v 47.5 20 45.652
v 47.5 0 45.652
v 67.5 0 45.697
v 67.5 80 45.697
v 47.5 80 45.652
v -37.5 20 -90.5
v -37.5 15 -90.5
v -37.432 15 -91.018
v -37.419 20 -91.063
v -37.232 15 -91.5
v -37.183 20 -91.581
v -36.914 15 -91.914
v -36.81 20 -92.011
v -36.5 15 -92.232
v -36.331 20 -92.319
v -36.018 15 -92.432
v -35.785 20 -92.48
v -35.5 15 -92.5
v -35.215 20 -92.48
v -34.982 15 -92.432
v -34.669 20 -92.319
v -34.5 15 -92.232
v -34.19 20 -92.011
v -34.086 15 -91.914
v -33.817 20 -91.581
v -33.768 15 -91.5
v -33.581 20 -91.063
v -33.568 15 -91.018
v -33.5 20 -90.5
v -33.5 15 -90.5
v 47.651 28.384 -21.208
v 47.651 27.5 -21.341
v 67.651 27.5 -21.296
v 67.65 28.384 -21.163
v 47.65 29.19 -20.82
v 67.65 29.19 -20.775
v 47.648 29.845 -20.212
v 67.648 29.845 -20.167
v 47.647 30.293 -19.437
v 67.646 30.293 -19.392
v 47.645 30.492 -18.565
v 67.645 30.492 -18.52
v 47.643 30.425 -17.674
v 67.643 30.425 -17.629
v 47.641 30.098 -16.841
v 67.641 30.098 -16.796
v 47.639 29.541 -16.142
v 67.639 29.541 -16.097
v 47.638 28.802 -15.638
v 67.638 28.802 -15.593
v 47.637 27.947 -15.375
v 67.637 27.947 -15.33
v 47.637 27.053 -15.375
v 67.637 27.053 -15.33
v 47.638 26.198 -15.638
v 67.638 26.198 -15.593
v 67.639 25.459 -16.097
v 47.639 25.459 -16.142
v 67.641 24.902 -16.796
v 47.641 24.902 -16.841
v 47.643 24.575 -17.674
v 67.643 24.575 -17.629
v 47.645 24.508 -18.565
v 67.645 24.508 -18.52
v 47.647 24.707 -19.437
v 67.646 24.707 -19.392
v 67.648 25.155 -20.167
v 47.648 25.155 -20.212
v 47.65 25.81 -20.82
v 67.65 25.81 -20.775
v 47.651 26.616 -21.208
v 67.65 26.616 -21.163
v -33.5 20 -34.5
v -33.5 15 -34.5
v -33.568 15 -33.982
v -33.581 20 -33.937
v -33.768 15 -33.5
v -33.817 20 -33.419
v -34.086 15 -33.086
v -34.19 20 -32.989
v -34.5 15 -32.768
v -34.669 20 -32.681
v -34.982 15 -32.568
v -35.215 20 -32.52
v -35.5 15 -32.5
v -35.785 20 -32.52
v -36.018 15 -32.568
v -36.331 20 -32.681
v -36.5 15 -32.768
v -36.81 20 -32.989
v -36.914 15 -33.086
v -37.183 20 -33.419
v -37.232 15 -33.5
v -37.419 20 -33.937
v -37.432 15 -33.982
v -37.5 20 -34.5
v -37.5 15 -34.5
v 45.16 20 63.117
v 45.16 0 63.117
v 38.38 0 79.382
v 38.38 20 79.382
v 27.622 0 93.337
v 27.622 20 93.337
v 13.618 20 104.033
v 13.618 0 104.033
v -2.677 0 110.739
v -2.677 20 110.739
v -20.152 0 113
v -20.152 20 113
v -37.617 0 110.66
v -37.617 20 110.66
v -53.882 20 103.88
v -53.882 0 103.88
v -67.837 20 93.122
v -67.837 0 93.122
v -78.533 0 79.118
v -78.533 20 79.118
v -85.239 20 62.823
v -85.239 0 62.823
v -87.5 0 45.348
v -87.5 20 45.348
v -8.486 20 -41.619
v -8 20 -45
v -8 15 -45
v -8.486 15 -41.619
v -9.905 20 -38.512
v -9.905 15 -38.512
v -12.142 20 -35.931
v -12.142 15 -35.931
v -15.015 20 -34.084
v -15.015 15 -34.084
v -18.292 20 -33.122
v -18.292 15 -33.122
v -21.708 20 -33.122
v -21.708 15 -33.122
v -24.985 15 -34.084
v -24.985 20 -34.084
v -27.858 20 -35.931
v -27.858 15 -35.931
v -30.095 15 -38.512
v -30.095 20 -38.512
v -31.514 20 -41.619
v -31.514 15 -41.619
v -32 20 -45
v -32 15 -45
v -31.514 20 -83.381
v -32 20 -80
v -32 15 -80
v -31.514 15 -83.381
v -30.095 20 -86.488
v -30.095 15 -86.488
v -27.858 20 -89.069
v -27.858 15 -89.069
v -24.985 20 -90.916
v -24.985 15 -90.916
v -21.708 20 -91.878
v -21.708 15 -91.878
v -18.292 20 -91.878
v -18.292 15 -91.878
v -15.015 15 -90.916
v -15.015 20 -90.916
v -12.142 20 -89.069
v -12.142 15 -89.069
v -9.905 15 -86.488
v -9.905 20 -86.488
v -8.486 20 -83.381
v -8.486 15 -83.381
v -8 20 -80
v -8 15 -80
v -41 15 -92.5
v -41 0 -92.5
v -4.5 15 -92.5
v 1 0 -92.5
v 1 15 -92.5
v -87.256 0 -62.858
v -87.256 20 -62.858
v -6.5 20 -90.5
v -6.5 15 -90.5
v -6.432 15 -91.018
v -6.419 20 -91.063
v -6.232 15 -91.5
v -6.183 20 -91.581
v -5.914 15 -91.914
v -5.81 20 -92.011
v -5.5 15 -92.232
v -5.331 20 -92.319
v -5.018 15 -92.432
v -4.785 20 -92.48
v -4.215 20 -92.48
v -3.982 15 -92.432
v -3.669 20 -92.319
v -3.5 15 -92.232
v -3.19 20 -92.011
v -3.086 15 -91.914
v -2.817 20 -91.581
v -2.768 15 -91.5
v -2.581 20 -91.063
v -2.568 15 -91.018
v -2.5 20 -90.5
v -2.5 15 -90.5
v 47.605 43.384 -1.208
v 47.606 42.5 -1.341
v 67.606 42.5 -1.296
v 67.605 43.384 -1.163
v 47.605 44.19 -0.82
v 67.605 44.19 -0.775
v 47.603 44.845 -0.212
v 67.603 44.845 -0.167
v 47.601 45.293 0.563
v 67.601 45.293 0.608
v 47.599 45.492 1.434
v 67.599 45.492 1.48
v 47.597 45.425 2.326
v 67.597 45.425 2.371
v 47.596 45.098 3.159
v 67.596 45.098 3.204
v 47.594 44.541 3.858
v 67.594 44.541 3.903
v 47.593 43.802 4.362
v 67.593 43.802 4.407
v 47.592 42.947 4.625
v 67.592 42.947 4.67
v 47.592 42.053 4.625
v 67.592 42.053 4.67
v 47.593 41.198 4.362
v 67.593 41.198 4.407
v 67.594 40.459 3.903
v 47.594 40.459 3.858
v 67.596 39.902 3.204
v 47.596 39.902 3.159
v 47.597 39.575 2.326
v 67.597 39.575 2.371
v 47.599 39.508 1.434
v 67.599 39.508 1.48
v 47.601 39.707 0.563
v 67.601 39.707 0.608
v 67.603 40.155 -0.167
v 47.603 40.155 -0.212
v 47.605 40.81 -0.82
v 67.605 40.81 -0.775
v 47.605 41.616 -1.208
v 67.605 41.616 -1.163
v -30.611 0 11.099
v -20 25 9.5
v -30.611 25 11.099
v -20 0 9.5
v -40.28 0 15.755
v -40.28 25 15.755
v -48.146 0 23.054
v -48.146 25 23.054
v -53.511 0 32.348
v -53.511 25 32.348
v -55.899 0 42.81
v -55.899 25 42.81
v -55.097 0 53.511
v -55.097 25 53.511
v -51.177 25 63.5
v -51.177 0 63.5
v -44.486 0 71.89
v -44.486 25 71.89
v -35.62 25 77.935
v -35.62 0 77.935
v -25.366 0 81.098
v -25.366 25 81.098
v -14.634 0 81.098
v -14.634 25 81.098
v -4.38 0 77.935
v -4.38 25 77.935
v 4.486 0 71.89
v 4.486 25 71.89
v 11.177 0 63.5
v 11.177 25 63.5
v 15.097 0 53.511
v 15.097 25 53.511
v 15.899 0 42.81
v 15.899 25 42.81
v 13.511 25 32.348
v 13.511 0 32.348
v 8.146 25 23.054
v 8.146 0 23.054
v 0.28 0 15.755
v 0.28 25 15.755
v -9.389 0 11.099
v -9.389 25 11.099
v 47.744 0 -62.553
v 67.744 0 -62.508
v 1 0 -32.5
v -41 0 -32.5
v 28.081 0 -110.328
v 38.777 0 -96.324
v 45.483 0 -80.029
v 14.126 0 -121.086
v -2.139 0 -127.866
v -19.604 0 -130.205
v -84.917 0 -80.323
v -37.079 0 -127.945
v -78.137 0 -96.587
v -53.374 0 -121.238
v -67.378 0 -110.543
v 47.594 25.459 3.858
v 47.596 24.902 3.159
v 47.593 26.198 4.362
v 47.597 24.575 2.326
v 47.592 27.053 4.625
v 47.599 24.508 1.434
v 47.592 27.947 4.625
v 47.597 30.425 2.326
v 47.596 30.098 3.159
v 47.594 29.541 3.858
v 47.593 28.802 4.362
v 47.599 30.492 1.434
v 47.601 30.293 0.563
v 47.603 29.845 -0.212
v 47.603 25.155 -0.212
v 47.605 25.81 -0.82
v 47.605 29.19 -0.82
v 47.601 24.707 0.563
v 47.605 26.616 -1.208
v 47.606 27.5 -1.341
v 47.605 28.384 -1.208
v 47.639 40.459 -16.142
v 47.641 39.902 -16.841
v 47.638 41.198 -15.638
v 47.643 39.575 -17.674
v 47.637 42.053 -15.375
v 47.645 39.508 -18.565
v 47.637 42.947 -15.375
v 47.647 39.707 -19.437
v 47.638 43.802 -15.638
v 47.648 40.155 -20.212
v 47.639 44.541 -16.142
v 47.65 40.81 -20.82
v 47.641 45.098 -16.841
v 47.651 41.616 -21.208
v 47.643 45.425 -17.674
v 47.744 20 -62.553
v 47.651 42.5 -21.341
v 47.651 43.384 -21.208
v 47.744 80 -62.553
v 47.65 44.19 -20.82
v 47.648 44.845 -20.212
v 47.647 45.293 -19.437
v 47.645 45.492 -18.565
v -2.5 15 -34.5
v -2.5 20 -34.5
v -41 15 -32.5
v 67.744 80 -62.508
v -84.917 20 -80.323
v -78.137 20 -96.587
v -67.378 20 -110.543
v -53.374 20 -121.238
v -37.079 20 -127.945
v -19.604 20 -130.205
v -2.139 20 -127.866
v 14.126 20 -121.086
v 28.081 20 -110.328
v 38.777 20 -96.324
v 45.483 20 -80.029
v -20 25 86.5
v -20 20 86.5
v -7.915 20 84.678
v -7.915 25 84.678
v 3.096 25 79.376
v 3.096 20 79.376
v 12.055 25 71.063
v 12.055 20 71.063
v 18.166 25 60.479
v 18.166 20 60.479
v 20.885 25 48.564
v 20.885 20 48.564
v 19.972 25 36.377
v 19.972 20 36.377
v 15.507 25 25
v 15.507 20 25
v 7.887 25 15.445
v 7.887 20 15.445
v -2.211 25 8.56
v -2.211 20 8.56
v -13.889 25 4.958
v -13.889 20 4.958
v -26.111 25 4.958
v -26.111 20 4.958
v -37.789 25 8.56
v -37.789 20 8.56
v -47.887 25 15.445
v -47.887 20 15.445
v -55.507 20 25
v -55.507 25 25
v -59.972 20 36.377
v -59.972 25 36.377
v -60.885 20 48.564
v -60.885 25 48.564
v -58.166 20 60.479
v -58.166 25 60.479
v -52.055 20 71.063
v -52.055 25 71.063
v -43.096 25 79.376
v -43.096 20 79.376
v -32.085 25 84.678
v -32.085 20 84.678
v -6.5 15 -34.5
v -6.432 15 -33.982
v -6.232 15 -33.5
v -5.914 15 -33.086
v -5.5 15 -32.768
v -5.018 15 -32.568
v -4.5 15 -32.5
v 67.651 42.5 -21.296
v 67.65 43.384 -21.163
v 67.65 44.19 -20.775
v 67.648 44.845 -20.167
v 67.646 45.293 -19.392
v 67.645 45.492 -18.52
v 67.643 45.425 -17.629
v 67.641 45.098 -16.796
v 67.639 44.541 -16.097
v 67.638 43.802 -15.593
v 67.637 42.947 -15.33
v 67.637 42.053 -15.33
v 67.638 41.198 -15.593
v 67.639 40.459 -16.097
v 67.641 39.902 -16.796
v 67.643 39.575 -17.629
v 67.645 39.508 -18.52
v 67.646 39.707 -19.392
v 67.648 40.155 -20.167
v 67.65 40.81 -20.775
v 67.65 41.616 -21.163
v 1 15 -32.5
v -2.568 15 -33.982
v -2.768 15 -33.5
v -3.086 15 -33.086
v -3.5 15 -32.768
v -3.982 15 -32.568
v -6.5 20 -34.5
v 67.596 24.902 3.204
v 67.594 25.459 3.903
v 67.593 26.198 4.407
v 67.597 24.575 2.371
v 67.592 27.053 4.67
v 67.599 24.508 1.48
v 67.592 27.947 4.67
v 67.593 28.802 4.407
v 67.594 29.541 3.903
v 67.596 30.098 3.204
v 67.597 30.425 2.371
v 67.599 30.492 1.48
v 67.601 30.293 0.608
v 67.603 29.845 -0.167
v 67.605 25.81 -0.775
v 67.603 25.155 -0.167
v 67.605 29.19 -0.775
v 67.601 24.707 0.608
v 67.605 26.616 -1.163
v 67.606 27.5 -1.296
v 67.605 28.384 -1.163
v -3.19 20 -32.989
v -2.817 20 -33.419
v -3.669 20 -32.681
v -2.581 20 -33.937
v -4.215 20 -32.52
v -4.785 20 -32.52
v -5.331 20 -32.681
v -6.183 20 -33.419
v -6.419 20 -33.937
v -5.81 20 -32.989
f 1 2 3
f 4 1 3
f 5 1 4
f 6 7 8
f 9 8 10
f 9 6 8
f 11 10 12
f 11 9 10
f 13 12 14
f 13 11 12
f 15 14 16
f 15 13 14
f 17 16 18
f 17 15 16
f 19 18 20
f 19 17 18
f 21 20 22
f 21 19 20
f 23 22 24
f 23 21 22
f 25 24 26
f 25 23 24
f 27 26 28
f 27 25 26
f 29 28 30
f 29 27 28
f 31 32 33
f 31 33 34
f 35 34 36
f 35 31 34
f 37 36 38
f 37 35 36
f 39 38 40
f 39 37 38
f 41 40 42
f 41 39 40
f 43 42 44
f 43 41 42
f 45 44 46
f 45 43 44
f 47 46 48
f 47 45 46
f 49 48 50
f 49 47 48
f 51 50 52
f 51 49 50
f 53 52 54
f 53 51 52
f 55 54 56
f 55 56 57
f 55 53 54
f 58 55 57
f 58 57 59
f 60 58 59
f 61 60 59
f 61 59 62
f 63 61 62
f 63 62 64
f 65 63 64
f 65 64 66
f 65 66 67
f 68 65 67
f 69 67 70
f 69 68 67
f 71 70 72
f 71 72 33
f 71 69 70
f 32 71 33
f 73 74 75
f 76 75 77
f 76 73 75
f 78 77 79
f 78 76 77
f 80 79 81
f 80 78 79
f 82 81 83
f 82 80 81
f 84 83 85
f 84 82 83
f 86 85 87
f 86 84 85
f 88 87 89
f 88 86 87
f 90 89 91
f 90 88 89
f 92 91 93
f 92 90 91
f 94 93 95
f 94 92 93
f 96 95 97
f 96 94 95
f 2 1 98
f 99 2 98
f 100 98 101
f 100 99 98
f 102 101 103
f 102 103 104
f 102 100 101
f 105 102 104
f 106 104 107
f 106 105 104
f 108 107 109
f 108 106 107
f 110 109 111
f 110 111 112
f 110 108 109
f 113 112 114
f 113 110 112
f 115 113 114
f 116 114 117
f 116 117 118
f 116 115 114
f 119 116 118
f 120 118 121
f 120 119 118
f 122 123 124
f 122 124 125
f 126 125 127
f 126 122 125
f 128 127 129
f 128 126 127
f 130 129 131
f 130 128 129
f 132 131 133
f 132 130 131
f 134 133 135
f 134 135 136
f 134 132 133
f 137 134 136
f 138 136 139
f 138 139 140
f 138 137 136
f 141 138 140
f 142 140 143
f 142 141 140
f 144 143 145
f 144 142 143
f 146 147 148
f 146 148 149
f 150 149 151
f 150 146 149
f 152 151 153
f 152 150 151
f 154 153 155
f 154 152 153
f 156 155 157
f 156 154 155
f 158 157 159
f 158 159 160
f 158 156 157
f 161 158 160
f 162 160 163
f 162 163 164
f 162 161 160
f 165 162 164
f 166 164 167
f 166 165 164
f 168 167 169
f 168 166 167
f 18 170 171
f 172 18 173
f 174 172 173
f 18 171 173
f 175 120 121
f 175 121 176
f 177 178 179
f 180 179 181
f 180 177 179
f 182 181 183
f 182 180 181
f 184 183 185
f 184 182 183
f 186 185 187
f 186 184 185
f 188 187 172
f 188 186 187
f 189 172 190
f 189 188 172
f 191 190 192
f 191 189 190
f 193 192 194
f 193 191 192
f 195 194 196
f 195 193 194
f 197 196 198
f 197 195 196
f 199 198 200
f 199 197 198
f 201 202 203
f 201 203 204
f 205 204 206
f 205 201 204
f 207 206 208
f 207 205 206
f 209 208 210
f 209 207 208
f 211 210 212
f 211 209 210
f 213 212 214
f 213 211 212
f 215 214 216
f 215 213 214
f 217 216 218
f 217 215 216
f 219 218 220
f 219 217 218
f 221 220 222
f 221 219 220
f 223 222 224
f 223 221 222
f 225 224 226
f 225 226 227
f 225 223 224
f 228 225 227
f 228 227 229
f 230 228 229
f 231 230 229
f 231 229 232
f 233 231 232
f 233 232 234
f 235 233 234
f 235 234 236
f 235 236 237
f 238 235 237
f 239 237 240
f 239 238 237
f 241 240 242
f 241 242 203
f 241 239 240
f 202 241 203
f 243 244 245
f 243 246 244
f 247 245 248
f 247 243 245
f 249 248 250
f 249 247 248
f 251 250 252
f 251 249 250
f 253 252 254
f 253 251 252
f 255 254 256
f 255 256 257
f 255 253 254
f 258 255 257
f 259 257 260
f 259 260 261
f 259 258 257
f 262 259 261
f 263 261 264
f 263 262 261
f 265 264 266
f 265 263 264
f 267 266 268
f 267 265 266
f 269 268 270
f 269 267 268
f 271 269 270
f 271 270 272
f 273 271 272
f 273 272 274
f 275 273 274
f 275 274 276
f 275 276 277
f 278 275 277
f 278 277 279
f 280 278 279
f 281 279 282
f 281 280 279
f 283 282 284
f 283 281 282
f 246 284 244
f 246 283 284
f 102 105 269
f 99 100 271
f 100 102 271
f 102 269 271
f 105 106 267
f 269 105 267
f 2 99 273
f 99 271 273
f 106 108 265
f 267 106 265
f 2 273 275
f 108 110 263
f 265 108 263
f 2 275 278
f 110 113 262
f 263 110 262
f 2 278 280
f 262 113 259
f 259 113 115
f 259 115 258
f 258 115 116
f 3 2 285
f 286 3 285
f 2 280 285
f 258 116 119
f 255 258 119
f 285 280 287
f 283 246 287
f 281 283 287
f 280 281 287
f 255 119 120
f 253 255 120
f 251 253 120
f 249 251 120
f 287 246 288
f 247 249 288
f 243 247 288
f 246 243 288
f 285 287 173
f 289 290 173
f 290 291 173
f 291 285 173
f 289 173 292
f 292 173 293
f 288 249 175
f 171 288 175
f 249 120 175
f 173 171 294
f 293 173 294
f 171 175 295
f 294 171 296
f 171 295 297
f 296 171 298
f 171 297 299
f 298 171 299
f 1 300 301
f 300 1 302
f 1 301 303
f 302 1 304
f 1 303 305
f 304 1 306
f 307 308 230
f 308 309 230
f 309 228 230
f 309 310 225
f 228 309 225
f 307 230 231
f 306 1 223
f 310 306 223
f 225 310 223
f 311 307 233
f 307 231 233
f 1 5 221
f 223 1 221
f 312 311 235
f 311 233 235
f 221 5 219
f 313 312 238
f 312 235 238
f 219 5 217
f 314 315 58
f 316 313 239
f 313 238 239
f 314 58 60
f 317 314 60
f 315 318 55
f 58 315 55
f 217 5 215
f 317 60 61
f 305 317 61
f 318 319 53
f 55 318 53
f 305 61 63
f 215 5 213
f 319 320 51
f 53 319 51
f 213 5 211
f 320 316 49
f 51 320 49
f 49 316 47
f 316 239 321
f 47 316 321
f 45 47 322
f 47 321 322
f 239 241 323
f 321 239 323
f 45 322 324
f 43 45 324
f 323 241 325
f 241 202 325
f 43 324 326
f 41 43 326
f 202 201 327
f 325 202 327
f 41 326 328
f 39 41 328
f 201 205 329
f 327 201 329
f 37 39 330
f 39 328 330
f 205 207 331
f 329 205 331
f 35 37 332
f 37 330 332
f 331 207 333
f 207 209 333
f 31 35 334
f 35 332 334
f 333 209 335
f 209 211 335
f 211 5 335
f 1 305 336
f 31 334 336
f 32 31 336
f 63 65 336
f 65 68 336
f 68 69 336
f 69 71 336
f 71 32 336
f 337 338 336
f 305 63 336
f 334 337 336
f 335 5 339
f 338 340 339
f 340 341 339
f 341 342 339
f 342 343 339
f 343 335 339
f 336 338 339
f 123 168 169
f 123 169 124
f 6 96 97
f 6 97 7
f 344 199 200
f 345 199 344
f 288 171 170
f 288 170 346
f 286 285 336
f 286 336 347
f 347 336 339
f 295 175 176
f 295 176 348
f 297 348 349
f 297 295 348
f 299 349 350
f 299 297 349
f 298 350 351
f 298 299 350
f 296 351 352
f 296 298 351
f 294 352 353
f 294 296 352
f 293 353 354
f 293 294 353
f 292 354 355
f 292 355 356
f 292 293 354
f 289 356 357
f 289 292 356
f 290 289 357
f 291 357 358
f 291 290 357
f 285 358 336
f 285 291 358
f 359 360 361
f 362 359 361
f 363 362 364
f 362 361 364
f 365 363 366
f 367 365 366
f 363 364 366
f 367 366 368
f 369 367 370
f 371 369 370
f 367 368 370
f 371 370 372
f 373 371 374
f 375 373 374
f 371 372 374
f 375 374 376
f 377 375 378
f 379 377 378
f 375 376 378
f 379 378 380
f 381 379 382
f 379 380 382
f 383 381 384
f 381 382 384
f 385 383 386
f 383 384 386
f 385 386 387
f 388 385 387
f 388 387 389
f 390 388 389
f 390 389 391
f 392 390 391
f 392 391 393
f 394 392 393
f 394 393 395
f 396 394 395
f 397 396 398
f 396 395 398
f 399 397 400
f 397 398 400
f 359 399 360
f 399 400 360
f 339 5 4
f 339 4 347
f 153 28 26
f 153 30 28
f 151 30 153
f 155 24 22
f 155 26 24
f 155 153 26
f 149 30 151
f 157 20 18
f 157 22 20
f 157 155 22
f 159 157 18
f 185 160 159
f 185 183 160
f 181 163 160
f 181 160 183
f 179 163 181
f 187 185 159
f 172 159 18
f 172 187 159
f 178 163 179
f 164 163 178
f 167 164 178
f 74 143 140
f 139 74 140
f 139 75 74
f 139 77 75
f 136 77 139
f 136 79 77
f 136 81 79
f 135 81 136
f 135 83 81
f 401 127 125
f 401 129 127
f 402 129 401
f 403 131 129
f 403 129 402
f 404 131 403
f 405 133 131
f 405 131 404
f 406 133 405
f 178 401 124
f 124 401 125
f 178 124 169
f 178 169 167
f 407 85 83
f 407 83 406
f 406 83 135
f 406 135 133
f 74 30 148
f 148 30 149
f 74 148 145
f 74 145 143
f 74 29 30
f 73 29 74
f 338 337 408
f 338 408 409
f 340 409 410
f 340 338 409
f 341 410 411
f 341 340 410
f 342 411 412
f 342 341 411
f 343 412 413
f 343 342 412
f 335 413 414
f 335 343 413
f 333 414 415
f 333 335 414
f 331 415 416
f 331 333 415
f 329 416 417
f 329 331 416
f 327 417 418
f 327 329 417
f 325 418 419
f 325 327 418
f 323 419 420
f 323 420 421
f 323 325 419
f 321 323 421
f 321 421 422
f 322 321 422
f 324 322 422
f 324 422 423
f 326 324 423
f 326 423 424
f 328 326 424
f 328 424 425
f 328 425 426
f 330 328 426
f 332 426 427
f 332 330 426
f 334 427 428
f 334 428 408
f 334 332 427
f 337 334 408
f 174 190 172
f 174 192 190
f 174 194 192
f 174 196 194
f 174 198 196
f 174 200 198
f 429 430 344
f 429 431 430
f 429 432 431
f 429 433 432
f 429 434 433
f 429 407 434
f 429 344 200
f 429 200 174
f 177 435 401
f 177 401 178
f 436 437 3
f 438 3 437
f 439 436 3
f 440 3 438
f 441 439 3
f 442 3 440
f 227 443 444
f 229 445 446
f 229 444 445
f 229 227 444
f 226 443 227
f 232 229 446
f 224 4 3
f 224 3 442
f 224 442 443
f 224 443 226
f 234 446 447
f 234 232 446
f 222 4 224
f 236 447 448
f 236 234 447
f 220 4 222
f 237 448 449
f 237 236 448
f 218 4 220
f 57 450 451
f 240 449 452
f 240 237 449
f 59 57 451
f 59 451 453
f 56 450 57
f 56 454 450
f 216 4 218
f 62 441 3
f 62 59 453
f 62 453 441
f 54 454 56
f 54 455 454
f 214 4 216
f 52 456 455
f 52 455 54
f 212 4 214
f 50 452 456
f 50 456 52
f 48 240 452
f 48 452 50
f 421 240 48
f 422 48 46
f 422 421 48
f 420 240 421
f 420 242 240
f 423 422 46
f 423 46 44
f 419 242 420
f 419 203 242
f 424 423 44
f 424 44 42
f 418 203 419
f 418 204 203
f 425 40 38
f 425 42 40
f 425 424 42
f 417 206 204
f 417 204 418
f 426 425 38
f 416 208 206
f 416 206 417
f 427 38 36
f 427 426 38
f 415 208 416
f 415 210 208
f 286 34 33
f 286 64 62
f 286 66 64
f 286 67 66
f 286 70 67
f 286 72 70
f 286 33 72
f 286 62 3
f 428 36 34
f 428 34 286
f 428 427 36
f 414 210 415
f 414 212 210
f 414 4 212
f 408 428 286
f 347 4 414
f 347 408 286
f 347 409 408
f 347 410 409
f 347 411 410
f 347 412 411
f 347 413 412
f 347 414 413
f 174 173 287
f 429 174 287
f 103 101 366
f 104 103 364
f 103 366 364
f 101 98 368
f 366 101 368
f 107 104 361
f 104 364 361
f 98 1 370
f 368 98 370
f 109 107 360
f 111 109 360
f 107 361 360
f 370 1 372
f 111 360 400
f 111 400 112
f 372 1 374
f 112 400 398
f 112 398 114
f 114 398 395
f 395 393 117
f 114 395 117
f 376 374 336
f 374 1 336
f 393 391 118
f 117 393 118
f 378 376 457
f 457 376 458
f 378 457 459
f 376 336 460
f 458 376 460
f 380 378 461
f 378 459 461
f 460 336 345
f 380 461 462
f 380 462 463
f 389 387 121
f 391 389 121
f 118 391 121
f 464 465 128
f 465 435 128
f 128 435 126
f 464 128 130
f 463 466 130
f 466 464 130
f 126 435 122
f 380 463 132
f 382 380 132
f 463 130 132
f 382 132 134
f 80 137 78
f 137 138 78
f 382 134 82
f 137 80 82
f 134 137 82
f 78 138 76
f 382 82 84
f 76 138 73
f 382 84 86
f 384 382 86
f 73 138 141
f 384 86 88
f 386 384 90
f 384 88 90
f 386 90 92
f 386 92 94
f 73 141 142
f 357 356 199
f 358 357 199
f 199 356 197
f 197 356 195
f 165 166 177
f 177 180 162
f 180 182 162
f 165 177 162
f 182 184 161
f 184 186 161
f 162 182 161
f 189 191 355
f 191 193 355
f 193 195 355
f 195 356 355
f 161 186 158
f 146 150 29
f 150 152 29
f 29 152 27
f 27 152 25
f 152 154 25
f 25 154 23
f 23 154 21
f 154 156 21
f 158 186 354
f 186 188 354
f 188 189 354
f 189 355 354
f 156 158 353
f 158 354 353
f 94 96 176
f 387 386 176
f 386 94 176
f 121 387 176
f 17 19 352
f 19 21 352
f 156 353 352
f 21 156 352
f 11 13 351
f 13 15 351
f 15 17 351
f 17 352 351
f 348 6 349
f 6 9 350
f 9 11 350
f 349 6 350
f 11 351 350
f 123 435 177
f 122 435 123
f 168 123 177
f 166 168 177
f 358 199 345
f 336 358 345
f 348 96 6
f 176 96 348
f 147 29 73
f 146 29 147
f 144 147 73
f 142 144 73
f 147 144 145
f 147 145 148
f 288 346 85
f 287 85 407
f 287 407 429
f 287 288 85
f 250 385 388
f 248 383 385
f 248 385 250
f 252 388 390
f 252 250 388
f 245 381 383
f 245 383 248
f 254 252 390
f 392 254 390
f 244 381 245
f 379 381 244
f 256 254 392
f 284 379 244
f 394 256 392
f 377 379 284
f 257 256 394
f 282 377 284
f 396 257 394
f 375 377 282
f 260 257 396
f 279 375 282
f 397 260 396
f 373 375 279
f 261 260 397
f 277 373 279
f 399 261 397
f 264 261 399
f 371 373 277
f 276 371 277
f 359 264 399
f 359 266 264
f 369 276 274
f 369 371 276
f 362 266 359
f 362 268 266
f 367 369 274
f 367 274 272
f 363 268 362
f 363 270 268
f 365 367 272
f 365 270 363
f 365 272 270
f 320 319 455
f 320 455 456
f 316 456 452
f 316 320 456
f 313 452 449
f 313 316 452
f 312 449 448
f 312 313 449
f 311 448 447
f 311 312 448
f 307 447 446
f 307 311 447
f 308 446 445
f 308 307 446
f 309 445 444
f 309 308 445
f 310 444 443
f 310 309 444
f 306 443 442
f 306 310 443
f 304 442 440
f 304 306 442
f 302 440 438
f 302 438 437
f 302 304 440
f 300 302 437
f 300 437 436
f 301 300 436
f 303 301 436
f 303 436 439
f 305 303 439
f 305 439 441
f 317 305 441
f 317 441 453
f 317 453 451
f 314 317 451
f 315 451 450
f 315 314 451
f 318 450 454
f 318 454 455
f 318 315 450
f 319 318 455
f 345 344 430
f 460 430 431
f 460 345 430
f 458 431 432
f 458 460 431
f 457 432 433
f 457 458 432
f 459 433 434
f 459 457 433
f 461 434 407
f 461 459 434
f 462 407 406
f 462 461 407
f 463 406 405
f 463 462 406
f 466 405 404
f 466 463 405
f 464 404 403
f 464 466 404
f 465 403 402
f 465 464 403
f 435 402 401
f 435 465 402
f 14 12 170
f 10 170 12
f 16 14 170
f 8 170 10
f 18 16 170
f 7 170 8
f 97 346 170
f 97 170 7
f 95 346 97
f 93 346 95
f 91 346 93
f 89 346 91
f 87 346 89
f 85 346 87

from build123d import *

# Parameters (mm, degrees)
BOSS_EXTRUDE1_DEPTH = 20
SKETCH8_W           = 42
SKETCH8_H           = 60
CUT_EXTRUDE1_DEPTH  = 15
CUT_EXTRUDE2_START  = -5
CUT_EXTRUDE2_DEPTH  = 5
SKETCH10_R          = 36
CUT_EXTRUDE3_DEPTH  = 159.144630057
SKETCH11_R          = 41
SKETCH11_R_2        = 36
BOSS_EXTRUDE4_DEPTH = 5
SKETCH2_W           = 108.205781707
SKETCH2_H           = 80
SKETCH2_R           = 3
BOSS_EXTRUDE6_DEPTH = 20


# Read off the part's stored shape, not the designer's step: Cut-Extrude2
with BuildPart() as part:
    # Sketch1 → Boss-Extrude1 (new body)
    with BuildSketch(Plane(origin=(0, 0, 0), x_dir=(1, 0, 0), z_dir=(0, 1, 0))):
        with BuildLine():
            Line((47.743715131, 62.553367624), (47.499828545, -45.652139232))
            ThreePointArc((47.499828545, -45.652139232), (-20.152139232, -112.999828545), (-87.499828545, -45.347860768))
            Line((-87.499828545, -45.347860768), (-87.25594196, 62.857646088))
            ThreePointArc((-87.25594196, 62.857646088), (-19.603974182, 130.205335402), (47.743715131, 62.553367624))
        make_face()
    extrude(amount=BOSS_EXTRUDE1_DEPTH)

    # Sketch8 → Cut-Extrude1 (cut)
    with BuildSketch(Plane.XZ):
        with Locations((-20, -62.5)):
            Rectangle(SKETCH8_W, SKETCH8_H)
    extrude(amount=-CUT_EXTRUDE1_DEPTH, mode=Mode.SUBTRACT)

    # Cut-Extrude2 outline → Cut-Extrude2 (cut)
    with BuildSketch(Plane.XZ.offset(-15).offset(CUT_EXTRUDE2_START)):
        with BuildLine():
            Line((-6.5, -34.5), (-6.5, -90.5))
            ThreePointArc((-6.5, -90.5), (-4.5, -92.5), (-2.5, -90.5))
            Line((-2.5, -90.5), (-2.5, -34.5))
            ThreePointArc((-2.5, -34.5), (-4.5, -32.5), (-6.5, -34.5))
        make_face()
        with BuildLine():
            ThreePointArc((-8, -45), (-20, -33), (-32, -45))
            Line((-32, -45), (-32, -80))
            ThreePointArc((-32, -80), (-20, -92), (-8, -80))
            Line((-8, -80), (-8, -45))
        make_face()
        with BuildLine():
            Line((-37.5, -34.5), (-37.5, -90.5))
            ThreePointArc((-37.5, -90.5), (-35.5, -92.5), (-33.5, -90.5))
            Line((-33.5, -90.5), (-33.5, -34.5))
            ThreePointArc((-33.5, -34.5), (-35.5, -32.5), (-37.5, -34.5))
        make_face()
    extrude(amount=CUT_EXTRUDE2_DEPTH, mode=Mode.SUBTRACT)

    # Sketch10 → Cut-Extrude3 (cut, through all)
    with BuildSketch(Plane.XZ):
        with Locations(Location((-20, 45.5, 0), (0, 0, 270))):
            Circle(SKETCH10_R)
    extrude(amount=-CUT_EXTRUDE3_DEPTH, mode=Mode.SUBTRACT)

    # Sketch11 → Boss-Extrude4 (add)
    with BuildSketch(Plane(origin=(0, 20, 0), x_dir=(1, 0, 0), z_dir=(0, 1, 0))):
        with Locations(Location((-20, -45.5, 0), (0, 0, 270))):
            Circle(SKETCH11_R)
        with Locations(Location((-20, -45.5, 0), (0, 0, 90))):
            Circle(SKETCH11_R_2, mode=Mode.SUBTRACT)
    extrude(amount=BOSS_EXTRUDE4_DEPTH)

    # Sketch2 → Boss-Extrude6 (add)
    with BuildSketch(Plane(origin=(47.602482999, 0, 0.107292202), x_dir=(0.002253914548687051, 0, -0.9999974599313777), z_dir=(0.9999974599313777, 0, 0.002253914548687051))):
        with Locations((8.557928136, 40)):
            Rectangle(SKETCH2_W, SKETCH2_H)
        with Locations((-1.551375347, 27.5)):
            Circle(SKETCH2_R, mode=Mode.SUBTRACT)
        with Locations((18.448624653, 27.5)):
            Circle(SKETCH2_R, mode=Mode.SUBTRACT)
        with Locations((18.448624653, 42.5)):
            Circle(SKETCH2_R, mode=Mode.SUBTRACT)
        with Locations((-1.551375347, 42.5)):
            Circle(SKETCH2_R, mode=Mode.SUBTRACT)
    extrude(amount=BOSS_EXTRUDE6_DEPTH)


solid = part.part
